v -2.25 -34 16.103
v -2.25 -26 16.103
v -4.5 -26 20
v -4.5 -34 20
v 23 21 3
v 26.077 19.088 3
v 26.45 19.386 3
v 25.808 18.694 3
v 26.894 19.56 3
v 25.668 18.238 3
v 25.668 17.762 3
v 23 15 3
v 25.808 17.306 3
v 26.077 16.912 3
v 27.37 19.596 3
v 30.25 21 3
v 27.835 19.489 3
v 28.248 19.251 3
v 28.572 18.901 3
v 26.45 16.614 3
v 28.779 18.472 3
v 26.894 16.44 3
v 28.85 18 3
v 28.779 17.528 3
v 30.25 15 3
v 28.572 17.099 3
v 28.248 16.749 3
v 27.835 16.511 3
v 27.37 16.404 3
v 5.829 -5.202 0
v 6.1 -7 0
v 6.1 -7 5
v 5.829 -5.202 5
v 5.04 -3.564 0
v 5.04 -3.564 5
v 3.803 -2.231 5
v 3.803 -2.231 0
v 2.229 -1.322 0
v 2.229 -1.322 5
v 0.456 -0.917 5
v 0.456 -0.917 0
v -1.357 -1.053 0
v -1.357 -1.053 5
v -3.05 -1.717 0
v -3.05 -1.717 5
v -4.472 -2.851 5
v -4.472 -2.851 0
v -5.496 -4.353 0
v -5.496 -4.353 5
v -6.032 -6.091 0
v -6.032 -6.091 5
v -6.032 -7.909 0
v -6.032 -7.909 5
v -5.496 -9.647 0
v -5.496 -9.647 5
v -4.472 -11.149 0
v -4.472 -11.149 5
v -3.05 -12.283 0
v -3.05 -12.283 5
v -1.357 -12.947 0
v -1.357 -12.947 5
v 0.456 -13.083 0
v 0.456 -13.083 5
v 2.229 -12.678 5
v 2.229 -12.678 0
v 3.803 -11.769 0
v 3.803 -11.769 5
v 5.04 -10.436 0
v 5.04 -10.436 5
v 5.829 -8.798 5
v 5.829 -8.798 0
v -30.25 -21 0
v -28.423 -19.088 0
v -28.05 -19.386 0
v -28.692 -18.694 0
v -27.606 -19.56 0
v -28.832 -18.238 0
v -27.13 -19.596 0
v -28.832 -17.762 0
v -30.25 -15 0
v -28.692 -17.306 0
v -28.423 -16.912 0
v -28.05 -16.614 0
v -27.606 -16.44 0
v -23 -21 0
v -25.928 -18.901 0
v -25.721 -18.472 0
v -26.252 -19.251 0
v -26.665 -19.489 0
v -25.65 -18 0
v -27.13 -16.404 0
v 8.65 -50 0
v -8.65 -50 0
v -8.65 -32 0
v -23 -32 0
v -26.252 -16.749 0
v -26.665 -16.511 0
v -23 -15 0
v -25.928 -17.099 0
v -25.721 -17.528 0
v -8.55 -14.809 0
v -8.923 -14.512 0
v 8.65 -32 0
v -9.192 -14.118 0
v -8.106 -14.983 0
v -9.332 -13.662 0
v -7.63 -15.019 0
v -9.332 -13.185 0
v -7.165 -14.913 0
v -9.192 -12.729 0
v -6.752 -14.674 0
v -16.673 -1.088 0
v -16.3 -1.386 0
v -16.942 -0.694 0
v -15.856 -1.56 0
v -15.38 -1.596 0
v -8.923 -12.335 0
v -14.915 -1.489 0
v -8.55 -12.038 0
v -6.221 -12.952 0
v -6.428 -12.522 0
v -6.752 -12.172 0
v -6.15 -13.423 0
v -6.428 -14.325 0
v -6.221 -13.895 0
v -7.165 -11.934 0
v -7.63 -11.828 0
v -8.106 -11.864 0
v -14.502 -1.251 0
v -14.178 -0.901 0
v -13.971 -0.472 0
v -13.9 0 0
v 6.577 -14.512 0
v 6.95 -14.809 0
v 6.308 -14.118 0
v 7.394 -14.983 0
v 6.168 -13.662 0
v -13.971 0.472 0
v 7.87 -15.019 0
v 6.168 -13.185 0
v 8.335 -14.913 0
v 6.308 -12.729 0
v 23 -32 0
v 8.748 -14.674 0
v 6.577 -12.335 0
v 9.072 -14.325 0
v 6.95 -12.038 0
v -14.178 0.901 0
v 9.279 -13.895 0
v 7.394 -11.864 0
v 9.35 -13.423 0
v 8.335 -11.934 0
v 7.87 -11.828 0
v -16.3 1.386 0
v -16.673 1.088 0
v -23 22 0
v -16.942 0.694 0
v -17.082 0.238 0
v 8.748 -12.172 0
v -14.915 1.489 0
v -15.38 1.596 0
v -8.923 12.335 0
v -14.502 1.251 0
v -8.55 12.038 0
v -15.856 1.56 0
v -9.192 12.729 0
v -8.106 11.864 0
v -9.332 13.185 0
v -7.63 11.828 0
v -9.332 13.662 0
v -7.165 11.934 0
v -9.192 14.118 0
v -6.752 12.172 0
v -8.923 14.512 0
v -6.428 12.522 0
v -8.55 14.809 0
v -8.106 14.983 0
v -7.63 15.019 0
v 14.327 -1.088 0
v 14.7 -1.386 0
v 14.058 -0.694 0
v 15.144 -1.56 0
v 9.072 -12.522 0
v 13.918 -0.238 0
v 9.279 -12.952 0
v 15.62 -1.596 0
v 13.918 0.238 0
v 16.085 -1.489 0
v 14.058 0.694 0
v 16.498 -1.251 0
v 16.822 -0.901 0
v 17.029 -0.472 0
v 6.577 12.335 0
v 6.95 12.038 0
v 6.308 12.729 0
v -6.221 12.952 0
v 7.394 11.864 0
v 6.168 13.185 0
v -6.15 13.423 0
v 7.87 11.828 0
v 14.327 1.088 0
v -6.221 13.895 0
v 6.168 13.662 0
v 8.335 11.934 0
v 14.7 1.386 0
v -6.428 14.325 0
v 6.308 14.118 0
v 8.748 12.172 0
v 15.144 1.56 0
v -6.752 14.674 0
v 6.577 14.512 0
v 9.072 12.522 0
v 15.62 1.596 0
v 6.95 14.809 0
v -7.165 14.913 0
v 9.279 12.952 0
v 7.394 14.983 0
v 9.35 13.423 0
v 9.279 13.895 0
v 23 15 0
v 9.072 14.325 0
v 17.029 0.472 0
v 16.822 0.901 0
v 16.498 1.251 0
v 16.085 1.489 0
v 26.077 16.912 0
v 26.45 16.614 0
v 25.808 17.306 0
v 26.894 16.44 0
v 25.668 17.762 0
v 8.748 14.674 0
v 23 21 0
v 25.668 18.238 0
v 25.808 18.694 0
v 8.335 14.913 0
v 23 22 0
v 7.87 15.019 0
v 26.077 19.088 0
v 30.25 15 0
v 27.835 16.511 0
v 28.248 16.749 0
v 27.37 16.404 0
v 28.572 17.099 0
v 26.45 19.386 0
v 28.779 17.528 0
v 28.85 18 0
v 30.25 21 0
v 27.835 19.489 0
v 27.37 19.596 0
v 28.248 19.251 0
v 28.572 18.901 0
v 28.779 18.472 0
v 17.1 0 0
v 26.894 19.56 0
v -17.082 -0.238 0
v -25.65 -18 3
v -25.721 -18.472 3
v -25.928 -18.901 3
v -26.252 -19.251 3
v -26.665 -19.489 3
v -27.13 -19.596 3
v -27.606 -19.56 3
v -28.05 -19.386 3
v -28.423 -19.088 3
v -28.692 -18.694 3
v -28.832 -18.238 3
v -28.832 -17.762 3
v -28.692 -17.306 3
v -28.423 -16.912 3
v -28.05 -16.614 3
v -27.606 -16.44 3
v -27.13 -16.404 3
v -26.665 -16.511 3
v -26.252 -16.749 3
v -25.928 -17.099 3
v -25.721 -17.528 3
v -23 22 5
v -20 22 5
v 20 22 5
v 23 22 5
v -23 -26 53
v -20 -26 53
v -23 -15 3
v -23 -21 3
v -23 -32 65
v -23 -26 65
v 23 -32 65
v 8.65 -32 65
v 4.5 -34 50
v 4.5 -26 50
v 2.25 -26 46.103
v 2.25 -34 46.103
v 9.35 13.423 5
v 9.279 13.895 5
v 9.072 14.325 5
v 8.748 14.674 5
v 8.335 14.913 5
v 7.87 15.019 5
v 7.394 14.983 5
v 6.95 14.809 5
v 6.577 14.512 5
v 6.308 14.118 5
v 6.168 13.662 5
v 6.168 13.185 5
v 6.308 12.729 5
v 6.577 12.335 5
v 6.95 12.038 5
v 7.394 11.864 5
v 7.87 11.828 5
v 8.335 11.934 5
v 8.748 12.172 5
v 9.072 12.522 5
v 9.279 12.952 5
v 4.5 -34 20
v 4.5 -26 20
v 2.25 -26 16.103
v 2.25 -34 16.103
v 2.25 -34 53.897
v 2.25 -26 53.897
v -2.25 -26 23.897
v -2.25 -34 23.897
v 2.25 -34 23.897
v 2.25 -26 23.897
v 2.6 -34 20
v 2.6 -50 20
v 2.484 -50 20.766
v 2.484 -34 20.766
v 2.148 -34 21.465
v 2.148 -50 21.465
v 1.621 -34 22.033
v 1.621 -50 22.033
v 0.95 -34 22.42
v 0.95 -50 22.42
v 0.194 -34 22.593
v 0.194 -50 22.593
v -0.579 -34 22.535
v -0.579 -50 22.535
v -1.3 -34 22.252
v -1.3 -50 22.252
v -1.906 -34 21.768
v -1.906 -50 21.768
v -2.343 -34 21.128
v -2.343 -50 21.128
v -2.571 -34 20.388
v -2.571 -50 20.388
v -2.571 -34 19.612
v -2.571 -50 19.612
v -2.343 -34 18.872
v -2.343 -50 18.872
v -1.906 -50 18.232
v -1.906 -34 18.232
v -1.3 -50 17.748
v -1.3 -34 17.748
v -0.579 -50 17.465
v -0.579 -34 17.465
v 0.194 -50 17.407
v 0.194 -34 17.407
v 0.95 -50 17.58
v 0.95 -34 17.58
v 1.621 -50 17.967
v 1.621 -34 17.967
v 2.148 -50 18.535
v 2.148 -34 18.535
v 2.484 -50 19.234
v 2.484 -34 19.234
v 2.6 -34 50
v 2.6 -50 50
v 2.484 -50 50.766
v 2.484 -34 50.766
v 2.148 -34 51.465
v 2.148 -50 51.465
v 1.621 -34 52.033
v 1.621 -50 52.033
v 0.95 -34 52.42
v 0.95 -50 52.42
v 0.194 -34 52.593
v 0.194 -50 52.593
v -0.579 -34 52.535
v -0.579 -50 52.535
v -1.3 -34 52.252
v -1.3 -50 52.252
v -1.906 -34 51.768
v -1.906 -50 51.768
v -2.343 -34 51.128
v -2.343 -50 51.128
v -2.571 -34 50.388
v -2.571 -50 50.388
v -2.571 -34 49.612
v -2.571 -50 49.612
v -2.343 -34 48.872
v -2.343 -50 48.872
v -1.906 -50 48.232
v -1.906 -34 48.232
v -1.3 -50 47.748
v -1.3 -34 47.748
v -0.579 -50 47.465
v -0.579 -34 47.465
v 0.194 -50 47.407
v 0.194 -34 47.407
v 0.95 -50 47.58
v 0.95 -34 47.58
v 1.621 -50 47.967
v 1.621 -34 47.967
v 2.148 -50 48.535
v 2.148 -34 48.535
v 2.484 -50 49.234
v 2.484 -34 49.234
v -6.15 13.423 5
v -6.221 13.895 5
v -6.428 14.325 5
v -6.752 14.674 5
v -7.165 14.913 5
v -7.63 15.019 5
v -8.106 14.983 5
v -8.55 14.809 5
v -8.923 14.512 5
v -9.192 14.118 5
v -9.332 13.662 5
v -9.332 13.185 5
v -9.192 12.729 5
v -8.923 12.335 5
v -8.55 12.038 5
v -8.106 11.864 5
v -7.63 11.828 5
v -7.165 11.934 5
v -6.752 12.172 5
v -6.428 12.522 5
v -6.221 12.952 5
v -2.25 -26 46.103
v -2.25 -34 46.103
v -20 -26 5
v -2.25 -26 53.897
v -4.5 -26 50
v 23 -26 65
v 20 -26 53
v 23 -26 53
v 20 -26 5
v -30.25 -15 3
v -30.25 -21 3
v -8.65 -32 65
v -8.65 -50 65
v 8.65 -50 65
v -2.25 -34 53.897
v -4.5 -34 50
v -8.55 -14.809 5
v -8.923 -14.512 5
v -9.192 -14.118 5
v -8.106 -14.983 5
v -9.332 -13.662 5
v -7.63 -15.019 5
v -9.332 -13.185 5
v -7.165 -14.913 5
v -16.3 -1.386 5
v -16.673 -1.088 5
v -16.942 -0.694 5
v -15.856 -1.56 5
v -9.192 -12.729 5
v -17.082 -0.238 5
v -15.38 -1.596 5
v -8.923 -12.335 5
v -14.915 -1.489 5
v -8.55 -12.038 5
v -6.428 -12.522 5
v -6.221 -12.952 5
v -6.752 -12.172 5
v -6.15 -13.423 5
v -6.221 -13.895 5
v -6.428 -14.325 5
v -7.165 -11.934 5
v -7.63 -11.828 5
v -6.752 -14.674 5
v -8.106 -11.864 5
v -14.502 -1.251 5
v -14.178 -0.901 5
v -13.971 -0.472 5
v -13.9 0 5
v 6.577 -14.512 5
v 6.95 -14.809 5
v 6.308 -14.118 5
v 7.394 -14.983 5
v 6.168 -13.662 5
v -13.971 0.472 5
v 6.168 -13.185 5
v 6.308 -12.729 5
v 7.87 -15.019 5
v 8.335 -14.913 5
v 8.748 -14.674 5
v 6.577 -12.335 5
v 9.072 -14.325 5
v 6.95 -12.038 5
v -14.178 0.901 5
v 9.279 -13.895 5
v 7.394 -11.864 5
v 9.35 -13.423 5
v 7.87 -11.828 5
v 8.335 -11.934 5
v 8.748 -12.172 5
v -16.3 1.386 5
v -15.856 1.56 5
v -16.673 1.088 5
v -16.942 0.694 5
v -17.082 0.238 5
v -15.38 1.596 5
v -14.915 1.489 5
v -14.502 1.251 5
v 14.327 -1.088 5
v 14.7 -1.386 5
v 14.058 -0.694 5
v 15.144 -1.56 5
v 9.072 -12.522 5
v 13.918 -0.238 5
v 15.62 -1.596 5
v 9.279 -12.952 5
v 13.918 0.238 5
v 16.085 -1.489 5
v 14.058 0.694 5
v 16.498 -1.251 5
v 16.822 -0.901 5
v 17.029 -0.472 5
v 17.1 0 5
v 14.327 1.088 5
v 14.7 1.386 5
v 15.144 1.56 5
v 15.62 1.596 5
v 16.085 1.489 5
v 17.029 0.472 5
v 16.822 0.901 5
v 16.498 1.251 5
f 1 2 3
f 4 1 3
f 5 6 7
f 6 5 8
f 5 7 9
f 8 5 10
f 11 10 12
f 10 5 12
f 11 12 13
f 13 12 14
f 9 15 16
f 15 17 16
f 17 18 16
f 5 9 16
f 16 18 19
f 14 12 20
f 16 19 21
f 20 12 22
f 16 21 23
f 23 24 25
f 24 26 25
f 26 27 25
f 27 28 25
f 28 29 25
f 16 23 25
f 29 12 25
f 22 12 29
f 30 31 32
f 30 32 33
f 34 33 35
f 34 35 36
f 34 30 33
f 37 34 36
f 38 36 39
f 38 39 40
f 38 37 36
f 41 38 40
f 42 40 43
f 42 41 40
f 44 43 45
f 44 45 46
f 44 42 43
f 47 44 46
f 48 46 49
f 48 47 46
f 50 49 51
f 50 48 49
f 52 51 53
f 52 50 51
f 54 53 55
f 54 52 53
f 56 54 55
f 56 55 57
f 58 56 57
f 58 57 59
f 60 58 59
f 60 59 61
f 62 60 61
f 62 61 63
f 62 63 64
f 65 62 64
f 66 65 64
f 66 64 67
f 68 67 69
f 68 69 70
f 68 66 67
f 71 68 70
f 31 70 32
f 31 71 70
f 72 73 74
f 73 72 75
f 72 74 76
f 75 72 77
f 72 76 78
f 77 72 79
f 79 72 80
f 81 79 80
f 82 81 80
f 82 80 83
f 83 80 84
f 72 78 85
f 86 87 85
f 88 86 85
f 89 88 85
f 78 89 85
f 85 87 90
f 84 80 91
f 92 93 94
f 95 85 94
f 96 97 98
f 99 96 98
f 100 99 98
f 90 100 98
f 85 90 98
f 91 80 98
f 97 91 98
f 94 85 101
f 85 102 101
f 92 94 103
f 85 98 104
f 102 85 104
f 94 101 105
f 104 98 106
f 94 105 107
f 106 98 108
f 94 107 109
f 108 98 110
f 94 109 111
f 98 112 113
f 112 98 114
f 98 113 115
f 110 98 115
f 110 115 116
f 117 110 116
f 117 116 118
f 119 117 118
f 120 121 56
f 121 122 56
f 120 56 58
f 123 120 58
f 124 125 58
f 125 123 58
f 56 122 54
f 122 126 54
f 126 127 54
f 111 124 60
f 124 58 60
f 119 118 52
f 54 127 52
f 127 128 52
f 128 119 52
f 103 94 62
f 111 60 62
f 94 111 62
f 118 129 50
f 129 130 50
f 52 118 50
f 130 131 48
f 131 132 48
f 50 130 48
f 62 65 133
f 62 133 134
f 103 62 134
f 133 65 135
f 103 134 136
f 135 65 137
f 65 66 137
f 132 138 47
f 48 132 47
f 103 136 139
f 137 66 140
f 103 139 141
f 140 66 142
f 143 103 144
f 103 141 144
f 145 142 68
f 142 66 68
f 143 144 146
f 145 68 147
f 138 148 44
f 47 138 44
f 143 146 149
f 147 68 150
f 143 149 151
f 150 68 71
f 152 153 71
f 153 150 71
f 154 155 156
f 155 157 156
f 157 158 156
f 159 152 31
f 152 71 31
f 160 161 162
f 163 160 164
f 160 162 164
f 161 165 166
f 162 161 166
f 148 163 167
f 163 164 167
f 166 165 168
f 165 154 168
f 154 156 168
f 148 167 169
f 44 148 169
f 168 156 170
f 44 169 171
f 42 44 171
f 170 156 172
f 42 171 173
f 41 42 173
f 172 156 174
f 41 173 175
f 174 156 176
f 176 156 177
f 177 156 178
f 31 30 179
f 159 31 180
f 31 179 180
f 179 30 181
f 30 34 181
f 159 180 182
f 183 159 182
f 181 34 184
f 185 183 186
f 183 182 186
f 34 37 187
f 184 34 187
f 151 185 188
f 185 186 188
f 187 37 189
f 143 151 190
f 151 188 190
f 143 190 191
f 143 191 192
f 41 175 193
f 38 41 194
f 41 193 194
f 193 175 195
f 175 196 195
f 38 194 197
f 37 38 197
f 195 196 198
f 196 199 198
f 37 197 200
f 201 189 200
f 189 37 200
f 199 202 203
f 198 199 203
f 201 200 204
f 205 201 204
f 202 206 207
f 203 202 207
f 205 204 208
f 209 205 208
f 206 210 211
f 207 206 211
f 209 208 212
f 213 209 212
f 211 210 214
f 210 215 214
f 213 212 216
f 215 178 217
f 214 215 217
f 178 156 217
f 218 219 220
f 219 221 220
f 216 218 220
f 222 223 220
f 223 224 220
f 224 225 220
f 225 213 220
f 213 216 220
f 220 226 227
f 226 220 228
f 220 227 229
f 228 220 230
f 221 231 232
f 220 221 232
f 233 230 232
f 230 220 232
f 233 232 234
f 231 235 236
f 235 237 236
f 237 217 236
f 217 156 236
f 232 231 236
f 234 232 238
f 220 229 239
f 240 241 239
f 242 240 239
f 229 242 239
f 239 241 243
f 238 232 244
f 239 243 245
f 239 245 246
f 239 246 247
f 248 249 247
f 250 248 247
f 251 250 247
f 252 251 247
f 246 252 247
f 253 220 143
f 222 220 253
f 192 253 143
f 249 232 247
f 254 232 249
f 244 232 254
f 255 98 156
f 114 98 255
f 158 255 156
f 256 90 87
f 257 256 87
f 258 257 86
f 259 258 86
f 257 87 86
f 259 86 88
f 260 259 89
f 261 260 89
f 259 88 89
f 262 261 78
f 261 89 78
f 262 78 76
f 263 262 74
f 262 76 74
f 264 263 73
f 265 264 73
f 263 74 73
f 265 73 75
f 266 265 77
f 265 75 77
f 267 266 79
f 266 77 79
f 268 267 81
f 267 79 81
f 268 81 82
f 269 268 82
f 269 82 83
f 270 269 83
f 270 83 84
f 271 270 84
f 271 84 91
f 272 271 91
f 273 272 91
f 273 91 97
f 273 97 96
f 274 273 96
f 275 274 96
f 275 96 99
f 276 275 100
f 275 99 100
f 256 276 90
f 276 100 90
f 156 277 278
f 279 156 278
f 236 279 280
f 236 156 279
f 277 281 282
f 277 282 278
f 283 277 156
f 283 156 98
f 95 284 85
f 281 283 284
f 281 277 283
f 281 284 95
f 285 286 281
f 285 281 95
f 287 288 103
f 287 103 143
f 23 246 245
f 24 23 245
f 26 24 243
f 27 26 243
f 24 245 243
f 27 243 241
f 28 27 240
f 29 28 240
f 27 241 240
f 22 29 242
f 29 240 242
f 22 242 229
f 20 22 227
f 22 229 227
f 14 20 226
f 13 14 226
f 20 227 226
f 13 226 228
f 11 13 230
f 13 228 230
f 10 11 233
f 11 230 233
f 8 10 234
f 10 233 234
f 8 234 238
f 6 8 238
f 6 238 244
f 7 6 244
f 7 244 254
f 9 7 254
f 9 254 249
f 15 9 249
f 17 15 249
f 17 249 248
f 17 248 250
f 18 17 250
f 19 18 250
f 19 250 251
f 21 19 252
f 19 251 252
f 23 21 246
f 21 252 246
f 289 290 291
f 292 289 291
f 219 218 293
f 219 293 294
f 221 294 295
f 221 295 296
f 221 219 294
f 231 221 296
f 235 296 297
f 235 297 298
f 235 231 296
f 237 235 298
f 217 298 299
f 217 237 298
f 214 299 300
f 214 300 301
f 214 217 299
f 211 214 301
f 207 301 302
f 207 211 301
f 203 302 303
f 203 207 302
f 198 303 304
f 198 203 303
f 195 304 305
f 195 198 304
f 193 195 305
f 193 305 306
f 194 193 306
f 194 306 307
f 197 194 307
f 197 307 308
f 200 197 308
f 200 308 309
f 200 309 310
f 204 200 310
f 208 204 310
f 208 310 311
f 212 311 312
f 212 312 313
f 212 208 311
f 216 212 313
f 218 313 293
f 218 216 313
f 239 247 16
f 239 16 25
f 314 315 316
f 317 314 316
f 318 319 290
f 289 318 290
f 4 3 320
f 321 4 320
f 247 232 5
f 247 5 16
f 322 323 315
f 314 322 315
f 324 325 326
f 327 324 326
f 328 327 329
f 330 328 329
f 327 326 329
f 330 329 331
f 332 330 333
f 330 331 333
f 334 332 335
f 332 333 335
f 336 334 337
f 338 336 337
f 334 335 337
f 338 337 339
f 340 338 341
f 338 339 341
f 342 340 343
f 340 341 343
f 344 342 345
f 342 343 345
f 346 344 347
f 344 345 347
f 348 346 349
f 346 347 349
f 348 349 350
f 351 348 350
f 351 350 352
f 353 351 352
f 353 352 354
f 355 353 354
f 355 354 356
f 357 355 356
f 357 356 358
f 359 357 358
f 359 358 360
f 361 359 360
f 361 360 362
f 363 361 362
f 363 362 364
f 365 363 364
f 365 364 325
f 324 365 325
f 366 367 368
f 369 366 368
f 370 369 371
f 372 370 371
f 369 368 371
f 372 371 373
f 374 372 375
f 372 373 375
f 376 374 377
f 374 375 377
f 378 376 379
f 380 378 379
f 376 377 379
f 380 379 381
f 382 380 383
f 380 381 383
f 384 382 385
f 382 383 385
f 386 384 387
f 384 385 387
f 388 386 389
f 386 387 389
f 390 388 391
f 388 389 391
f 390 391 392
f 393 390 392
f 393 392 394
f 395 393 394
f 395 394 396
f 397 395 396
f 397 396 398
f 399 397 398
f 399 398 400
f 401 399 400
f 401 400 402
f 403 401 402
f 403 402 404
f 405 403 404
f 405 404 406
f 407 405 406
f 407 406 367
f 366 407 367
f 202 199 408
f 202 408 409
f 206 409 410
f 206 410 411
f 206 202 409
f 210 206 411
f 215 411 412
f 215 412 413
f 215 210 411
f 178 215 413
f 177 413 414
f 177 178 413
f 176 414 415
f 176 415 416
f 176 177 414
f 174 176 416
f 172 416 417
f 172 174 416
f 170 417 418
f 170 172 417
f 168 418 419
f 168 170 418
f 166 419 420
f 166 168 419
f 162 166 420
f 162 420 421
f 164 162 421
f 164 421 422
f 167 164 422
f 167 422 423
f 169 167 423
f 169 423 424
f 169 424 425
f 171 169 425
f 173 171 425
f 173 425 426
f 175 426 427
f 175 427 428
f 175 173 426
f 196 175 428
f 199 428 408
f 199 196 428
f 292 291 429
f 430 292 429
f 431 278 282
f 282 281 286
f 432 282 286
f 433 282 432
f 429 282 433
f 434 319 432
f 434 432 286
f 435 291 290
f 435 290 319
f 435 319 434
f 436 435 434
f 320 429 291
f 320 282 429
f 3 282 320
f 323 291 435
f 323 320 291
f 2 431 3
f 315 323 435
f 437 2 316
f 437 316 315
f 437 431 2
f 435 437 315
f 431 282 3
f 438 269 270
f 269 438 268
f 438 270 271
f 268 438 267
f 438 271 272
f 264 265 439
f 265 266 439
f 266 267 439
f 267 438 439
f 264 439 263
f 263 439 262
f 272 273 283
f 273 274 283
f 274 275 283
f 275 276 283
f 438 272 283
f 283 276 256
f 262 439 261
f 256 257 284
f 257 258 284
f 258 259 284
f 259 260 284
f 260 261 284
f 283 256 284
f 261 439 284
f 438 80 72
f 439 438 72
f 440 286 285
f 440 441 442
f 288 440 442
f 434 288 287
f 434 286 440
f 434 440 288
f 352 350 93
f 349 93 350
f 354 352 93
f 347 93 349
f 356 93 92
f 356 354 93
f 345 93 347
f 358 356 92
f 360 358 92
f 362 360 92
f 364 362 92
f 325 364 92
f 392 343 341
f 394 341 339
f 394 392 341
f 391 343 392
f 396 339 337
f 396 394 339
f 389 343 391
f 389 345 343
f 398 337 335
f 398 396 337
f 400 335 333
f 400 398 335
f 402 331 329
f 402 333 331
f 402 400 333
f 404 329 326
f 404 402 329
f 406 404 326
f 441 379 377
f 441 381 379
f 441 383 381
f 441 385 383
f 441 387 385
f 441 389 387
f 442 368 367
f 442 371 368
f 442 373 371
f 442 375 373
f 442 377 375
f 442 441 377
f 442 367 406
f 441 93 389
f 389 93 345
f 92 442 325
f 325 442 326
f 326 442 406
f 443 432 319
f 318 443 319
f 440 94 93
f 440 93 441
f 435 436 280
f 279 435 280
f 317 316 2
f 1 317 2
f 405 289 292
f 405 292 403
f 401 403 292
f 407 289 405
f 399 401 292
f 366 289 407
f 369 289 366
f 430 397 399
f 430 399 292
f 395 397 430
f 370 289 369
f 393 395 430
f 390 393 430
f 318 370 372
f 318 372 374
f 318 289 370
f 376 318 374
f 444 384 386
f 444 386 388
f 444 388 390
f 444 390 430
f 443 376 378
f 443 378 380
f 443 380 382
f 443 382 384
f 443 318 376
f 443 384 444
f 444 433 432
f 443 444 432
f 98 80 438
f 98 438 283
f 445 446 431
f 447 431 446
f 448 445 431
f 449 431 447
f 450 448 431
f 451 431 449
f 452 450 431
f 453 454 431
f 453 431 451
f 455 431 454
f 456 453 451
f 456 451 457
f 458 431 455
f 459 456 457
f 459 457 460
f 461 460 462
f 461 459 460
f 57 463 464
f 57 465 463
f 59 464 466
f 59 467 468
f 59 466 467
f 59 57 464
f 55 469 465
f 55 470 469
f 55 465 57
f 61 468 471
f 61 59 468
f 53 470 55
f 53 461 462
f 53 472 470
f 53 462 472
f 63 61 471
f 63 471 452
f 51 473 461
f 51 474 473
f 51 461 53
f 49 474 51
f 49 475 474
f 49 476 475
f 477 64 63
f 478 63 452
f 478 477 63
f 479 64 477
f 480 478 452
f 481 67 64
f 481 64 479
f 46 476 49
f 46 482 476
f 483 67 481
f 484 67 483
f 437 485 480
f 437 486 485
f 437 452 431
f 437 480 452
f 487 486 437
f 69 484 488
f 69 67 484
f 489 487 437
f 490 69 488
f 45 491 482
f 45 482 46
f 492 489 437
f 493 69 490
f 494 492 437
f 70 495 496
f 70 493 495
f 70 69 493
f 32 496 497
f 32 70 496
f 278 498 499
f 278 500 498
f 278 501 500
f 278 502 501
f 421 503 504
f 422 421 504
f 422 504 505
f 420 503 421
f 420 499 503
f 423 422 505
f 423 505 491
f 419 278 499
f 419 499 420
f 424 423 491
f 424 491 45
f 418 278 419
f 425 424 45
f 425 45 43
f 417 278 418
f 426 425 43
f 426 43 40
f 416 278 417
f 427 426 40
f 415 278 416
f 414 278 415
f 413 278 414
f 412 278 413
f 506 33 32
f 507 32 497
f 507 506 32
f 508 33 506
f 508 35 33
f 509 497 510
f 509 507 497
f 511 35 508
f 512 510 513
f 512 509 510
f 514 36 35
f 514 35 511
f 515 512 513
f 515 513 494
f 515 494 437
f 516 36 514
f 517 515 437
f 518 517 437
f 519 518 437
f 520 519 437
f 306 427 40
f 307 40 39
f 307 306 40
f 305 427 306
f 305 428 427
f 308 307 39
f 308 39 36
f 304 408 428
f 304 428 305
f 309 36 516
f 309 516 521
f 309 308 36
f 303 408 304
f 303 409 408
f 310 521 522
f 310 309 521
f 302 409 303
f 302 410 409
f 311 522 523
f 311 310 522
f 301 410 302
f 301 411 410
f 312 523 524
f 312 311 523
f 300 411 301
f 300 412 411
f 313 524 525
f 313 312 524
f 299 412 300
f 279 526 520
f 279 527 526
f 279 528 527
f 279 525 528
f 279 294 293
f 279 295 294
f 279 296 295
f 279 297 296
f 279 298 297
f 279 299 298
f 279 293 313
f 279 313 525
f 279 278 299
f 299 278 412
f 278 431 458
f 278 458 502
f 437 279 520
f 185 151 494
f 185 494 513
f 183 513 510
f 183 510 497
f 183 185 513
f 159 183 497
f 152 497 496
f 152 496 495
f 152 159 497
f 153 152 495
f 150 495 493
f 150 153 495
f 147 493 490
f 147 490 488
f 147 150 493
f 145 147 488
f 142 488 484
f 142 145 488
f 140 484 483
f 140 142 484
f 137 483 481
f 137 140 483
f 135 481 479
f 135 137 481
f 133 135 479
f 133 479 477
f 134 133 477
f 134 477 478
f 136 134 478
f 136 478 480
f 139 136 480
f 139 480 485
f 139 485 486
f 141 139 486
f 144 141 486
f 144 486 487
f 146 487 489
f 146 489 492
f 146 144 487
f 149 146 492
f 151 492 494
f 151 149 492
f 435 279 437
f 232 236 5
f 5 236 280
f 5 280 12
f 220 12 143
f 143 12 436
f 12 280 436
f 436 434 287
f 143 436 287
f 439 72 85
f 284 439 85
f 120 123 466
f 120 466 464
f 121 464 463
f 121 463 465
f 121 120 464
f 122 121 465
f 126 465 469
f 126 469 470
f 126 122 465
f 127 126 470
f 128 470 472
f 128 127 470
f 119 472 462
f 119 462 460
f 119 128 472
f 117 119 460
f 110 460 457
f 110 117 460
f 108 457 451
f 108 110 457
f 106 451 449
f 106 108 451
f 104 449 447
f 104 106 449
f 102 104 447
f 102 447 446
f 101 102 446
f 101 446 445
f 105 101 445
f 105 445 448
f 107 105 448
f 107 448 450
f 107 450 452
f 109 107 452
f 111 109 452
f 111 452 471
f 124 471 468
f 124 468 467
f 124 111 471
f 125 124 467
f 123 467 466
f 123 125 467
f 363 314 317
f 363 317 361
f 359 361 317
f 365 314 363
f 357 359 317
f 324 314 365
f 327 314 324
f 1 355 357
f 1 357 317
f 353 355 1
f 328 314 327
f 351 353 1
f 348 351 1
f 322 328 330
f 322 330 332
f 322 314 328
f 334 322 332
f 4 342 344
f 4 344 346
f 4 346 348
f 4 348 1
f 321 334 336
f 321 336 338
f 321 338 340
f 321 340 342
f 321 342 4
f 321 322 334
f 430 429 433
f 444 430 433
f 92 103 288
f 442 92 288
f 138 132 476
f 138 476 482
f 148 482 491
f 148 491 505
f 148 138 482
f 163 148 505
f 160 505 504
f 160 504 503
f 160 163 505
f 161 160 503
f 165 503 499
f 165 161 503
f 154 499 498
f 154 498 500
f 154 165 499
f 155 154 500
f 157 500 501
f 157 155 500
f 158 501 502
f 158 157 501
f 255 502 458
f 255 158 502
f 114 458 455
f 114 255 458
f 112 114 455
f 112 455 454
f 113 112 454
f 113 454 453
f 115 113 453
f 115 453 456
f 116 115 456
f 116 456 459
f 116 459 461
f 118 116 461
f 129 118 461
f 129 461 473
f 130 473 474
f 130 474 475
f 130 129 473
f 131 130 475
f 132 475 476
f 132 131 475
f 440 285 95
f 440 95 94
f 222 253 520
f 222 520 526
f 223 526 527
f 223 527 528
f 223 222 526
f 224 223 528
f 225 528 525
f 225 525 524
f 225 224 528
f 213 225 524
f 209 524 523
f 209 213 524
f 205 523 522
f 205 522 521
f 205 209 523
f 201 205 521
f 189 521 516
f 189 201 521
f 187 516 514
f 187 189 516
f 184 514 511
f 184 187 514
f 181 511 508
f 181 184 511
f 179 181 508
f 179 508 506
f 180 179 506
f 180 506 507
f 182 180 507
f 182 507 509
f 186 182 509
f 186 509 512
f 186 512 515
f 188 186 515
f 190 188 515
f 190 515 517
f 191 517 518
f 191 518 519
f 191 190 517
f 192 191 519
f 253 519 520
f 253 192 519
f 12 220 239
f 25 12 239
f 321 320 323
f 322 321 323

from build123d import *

# Parameters (mm, degrees)
SKETCH_W          = 46
SKETCH_H          = 48
SKETCH_R          = 1.6
SKETCH_R_2        = 6.1
PAD_DEPTH         = 5
SKETCH001_W       = 46
SKETCH001_H       = 6
PAD001_DEPTH      = 60
PAD001_DEPTH_BACK = 5
SKETCH002_W       = 17.3
SKETCH002_H       = 65
PAD002_DEPTH      = 18
POCKET_DEPTH      = 8
SKETCH004_R       = 2.6
POCKET001_DEPTH   = 72.001
PAD003_DEPTH      = 3
PAD004_DEPTH      = 3
SKETCH007_W       = 7.25
SKETCH007_H       = 6
SKETCH007_R       = 1.6
PAD005_DEPTH      = 3


with BuildPart() as part:
    # Sketch → Pad (new body)
    with BuildSketch(Plane.XY):
        with Locations((0, -2)):
            Rectangle(SKETCH_W, SKETCH_H)
        with Locations((-7.75, 13.423394)):
            Circle(SKETCH_R, mode=Mode.SUBTRACT)
        with Locations((7.75, 13.423394)):
            Circle(SKETCH_R, mode=Mode.SUBTRACT)
        with Locations((-15.5, 0)):
            Circle(SKETCH_R, mode=Mode.SUBTRACT)
        with Locations((-7.75, -13.423394)):
            Circle(SKETCH_R, mode=Mode.SUBTRACT)
        with Locations((7.75, -13.423394)):
            Circle(SKETCH_R, mode=Mode.SUBTRACT)
        with Locations((15.5, 0)):
            Circle(SKETCH_R, mode=Mode.SUBTRACT)
        with Locations((0, -7)):
            Circle(SKETCH_R_2, mode=Mode.SUBTRACT)
    extrude(amount=PAD_DEPTH)

    # Sketch001 → Pad001 (new body, two sides)
    with BuildSketch(Plane.XY.offset(5)) as pad001_sk:
        with Locations((0, -29)):
            Rectangle(SKETCH001_W, SKETCH001_H)
    extrude(amount=PAD001_DEPTH)
    extrude(pad001_sk.sketch, amount=-PAD001_DEPTH_BACK)

    # Sketch002 → Pad002 (new body)
    with BuildSketch(Plane.XZ.offset(32)):
        with Locations((0, 32.5)):
            Rectangle(SKETCH002_W, SKETCH002_H)
    extrude(amount=PAD002_DEPTH)

    # Sketch003 → Pocket (cut)
    with BuildSketch(Plane(origin=(0, -26, 0), x_dir=(-1, 0, 0), z_dir=(0, 1, 0))):
        Polygon((4.5, 50), (2.25, 53.897114), (-2.25, 53.897114), (-4.5, 50), (-2.25, 46.102886), (2.25, 46.102886), align=None)
        Polygon((4.5, 20), (2.25, 23.897114), (-2.25, 23.897114), (-4.5, 20), (-2.25, 16.102886), (2.25, 16.102886), align=None)
    extrude(amount=-POCKET_DEPTH, mode=Mode.SUBTRACT)

    # Sketch004 → Pocket001 (cut, through all)
    with BuildSketch(Plane.XZ.offset(50)):
        with Locations((0, 50)):
            Circle(SKETCH004_R)
        with Locations((0, 20)):
            Circle(SKETCH004_R)
    extrude(amount=-POCKET001_DEPTH, mode=Mode.SUBTRACT)

    # Sketch005 → Pad003 (new body)
    with BuildSketch(Plane(origin=(-23, 0, 0), x_dir=(0, -1, 0), z_dir=(-1, 0, 0))):
        Polygon((-22, 5), (26, 5), (26, 53), align=None)
    extrude(amount=-PAD003_DEPTH)

    # Sketch006 → Pad004 (new body)
    with BuildSketch(Plane.YZ.offset(23)):
        Polygon((22, 5), (-26, 5), (-26, 53), align=None)
    extrude(amount=-PAD004_DEPTH)

    # Sketch007 → Pad005 (new body)
    with BuildSketch(Plane(origin=(0, 0, 0), x_dir=(1, 0, 0), z_dir=(0, 0, -1))):
        with Locations((-26.625, 18)):
            Rectangle(SKETCH007_W, SKETCH007_H)
        with Locations((-27.25, 18)):
            Circle(SKETCH007_R, mode=Mode.SUBTRACT)
        with Locations((26.625, -18)):
            Rectangle(SKETCH007_W, SKETCH007_H)
        with Locations((27.25, -18)):
            Circle(SKETCH007_R, mode=Mode.SUBTRACT)
    extrude(amount=-PAD005_DEPTH)


solid = part.part
